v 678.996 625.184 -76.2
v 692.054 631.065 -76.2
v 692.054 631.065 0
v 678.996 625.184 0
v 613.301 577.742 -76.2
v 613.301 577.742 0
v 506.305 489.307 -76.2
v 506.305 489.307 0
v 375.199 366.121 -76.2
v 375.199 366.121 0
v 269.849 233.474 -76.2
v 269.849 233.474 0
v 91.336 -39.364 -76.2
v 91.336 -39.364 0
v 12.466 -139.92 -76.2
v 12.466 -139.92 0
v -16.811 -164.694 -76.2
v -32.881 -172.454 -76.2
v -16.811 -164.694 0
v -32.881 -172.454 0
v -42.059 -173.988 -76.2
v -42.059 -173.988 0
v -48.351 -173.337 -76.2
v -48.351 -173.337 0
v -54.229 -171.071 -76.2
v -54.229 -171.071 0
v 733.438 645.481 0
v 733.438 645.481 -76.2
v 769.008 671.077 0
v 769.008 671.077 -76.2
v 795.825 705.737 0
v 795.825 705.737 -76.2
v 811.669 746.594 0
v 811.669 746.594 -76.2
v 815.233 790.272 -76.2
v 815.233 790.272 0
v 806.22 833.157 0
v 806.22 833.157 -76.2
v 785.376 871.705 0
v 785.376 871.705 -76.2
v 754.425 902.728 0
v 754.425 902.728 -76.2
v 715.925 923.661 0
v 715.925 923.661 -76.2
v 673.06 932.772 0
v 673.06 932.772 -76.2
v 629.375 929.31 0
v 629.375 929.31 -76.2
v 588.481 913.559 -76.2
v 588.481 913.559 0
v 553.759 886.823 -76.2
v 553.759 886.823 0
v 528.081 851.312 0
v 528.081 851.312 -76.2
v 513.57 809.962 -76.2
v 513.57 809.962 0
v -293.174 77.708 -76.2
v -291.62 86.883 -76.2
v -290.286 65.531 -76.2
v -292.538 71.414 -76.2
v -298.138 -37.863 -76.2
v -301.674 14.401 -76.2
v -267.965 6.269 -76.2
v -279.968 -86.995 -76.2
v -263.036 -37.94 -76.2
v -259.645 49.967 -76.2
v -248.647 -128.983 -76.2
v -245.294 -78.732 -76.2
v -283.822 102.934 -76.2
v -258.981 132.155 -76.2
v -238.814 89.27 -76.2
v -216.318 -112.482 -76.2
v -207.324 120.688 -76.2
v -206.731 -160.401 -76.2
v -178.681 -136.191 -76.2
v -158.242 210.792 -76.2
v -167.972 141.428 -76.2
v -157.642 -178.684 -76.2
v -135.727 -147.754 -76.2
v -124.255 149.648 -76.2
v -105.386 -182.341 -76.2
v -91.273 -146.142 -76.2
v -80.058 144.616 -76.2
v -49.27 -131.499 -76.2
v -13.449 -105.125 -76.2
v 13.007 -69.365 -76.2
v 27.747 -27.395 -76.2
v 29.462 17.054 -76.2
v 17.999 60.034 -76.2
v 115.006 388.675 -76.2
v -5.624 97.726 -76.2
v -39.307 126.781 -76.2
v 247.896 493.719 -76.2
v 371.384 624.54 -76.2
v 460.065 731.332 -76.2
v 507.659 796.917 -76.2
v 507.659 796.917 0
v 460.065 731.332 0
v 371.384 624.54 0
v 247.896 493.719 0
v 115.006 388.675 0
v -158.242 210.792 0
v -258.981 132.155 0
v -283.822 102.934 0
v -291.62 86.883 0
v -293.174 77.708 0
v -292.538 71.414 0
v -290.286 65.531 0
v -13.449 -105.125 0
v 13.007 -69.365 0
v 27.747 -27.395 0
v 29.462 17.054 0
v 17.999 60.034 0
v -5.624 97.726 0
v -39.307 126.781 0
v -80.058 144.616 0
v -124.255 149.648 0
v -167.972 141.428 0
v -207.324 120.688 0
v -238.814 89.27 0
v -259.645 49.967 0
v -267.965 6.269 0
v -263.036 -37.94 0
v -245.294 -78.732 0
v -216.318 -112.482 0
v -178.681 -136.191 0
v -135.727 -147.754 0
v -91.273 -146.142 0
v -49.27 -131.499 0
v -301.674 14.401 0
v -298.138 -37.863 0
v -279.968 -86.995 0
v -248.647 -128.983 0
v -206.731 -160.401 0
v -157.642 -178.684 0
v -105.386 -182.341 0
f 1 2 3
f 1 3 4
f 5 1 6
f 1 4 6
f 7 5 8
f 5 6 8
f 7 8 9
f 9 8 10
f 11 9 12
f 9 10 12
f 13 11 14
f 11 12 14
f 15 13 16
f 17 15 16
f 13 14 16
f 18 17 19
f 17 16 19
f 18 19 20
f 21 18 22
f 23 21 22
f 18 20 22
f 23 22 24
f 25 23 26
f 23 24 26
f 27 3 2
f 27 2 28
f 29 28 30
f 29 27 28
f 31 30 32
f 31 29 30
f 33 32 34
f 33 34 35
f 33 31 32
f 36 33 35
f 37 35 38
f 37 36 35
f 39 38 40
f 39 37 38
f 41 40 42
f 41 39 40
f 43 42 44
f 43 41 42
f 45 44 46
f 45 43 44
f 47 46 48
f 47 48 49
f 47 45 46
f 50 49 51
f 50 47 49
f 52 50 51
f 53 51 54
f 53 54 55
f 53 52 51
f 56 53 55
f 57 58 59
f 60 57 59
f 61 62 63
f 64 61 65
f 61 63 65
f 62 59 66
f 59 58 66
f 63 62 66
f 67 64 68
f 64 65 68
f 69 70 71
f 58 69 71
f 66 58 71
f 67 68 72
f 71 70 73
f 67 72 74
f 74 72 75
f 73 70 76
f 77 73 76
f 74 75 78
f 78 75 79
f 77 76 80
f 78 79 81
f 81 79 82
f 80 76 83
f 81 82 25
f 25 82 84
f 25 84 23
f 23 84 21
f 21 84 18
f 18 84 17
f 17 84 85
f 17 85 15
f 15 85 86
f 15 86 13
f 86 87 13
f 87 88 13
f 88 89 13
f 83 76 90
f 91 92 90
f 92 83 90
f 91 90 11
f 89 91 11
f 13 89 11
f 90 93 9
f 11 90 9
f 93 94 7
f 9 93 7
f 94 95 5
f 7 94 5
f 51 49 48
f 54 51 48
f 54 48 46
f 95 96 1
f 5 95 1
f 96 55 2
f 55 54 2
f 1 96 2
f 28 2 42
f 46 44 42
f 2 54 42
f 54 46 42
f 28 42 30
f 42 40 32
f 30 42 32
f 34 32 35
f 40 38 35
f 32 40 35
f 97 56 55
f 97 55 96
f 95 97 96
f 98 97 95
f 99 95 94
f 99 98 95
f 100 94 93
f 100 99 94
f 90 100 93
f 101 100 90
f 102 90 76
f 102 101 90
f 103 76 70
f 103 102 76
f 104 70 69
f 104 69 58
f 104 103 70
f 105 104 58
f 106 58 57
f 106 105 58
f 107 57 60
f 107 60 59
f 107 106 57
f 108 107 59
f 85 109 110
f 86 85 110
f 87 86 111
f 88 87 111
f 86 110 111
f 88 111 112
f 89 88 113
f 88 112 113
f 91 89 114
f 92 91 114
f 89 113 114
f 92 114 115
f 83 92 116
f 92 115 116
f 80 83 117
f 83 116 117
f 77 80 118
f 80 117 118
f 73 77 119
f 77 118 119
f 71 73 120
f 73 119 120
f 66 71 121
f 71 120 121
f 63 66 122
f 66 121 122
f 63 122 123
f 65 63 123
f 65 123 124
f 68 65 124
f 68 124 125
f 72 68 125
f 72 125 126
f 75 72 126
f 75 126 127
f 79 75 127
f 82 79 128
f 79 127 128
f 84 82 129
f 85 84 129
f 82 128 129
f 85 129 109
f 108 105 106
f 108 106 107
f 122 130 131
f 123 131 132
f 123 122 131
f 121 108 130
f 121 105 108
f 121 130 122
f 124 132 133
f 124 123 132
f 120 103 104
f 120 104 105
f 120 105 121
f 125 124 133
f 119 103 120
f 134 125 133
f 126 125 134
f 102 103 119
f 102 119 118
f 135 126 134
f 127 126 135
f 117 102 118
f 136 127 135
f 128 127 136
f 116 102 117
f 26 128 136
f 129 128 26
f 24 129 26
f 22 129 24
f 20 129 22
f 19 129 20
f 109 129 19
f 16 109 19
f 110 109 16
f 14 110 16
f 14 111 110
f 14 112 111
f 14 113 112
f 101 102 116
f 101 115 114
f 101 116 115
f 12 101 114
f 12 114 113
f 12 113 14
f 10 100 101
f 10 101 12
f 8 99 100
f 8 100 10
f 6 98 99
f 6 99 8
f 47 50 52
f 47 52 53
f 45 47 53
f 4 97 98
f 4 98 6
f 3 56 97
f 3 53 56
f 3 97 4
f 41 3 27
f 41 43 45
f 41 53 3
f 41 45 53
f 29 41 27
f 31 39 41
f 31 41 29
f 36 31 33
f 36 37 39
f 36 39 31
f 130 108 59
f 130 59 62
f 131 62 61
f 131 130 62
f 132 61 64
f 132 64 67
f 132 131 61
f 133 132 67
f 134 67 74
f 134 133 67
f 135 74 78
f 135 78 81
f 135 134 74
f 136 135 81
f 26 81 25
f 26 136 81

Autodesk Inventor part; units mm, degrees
ref_plane "YZ Plane" through (0, 0, 0) normal (1, 0, 0) x (0, 1, 0)
ref_plane "XZ Plane" through (0, 0, 0) normal (0, 1, 0) x (-1, 0, 0)
ref_plane "XY Plane" through (0, 0, 0) normal (0, 0, 1) x (1, 0, 0)
ref_plane "Work Plane1" through (-35.1299, -83.394, 0) normal (0, 0, 1) x (0.7062905, -0.7079221, 0)
sketch "Sketch1" plane through (-35.1299, -83.394, 0) normal (0, 0, 1) x (0.7062905, -0.7079221, 0)
  circle A0 centre (-118.0078, -0.3279) radius 6.35 projected
  circle A1 centre (-118.5314, 0) radius 149.2286
  arc A2 (48.5793, -75.4462) -> (-285.6421, -75.4462) centre (-118.5314, 0) ccw
  line L0 (-118.5314, 0) -> (-118.5314, 1222.8979) construction
  arc A3 (-244.8846, 1019.4057) -> (7.8218, 1019.4057) centre (-118.5314, 1104.615) ccw
  spline S0 degree 4 poles (7.8218, 1019.4057) (-6.9781, 997.4595) (-39.0532, 578.2178) (-64.4023, 532.3679) (128.916, -51.9504) (48.5793, -75.4462) knots 0 0 0 0 0 0.373535 1 1 1 1 1
  line L1 (25.7608, 1046.0066) -> (-10.1171, 992.8047) construction
  arc A4 (19.6566, 1024.5678) -> (7.4714, 1006.4989) centre (17.8001, 1012.6766) ccw construction
  spline S1 degree 4 poles (-244.8846, 1019.4057) (-230.0846, 997.4595) (-198.0095, 578.2178) (-172.6604, 532.3679) (-365.9787, -51.9504) (-285.6421, -75.4462) knots 0 0 0 0 0 0.373535 1 1 1 1 1
  line L2 (-262.8235, 1046.0066) -> (-226.9456, 992.8047) construction
  arc A5 (-244.5341, 1006.4989) -> (-256.7193, 1024.5678) centre (-254.8628, 1012.6766) ccw construction
  arc A6 (-285.6421, -75.4462) -> (48.5793, -75.4462) centre (-118.5314, 0) ccw
  arc A7 (7.8218, 1019.4057) -> (-244.8846, 1019.4057) centre (-118.5314, 1104.615) ccw
  point P0 (-34.2245, 83.7696)
  point P1 (-21.2914, 810.23)
  point P2 (-21.2914, 520.0523)
  point P3 (59.9573, 110.7433)
  point P4 (-215.7713, 810.23)
  point P5 (-215.7713, 520.0523)
  point P6 (-297.02, 110.7433)
  dimension "d0" = 304.8
extrude "Extrusion1" add sketch "Sketch1" against normal blind 76.2 contours A6 A2 | A2 S1 A3 S0 | A3 A7
properties material "Wood (Cherry)"
